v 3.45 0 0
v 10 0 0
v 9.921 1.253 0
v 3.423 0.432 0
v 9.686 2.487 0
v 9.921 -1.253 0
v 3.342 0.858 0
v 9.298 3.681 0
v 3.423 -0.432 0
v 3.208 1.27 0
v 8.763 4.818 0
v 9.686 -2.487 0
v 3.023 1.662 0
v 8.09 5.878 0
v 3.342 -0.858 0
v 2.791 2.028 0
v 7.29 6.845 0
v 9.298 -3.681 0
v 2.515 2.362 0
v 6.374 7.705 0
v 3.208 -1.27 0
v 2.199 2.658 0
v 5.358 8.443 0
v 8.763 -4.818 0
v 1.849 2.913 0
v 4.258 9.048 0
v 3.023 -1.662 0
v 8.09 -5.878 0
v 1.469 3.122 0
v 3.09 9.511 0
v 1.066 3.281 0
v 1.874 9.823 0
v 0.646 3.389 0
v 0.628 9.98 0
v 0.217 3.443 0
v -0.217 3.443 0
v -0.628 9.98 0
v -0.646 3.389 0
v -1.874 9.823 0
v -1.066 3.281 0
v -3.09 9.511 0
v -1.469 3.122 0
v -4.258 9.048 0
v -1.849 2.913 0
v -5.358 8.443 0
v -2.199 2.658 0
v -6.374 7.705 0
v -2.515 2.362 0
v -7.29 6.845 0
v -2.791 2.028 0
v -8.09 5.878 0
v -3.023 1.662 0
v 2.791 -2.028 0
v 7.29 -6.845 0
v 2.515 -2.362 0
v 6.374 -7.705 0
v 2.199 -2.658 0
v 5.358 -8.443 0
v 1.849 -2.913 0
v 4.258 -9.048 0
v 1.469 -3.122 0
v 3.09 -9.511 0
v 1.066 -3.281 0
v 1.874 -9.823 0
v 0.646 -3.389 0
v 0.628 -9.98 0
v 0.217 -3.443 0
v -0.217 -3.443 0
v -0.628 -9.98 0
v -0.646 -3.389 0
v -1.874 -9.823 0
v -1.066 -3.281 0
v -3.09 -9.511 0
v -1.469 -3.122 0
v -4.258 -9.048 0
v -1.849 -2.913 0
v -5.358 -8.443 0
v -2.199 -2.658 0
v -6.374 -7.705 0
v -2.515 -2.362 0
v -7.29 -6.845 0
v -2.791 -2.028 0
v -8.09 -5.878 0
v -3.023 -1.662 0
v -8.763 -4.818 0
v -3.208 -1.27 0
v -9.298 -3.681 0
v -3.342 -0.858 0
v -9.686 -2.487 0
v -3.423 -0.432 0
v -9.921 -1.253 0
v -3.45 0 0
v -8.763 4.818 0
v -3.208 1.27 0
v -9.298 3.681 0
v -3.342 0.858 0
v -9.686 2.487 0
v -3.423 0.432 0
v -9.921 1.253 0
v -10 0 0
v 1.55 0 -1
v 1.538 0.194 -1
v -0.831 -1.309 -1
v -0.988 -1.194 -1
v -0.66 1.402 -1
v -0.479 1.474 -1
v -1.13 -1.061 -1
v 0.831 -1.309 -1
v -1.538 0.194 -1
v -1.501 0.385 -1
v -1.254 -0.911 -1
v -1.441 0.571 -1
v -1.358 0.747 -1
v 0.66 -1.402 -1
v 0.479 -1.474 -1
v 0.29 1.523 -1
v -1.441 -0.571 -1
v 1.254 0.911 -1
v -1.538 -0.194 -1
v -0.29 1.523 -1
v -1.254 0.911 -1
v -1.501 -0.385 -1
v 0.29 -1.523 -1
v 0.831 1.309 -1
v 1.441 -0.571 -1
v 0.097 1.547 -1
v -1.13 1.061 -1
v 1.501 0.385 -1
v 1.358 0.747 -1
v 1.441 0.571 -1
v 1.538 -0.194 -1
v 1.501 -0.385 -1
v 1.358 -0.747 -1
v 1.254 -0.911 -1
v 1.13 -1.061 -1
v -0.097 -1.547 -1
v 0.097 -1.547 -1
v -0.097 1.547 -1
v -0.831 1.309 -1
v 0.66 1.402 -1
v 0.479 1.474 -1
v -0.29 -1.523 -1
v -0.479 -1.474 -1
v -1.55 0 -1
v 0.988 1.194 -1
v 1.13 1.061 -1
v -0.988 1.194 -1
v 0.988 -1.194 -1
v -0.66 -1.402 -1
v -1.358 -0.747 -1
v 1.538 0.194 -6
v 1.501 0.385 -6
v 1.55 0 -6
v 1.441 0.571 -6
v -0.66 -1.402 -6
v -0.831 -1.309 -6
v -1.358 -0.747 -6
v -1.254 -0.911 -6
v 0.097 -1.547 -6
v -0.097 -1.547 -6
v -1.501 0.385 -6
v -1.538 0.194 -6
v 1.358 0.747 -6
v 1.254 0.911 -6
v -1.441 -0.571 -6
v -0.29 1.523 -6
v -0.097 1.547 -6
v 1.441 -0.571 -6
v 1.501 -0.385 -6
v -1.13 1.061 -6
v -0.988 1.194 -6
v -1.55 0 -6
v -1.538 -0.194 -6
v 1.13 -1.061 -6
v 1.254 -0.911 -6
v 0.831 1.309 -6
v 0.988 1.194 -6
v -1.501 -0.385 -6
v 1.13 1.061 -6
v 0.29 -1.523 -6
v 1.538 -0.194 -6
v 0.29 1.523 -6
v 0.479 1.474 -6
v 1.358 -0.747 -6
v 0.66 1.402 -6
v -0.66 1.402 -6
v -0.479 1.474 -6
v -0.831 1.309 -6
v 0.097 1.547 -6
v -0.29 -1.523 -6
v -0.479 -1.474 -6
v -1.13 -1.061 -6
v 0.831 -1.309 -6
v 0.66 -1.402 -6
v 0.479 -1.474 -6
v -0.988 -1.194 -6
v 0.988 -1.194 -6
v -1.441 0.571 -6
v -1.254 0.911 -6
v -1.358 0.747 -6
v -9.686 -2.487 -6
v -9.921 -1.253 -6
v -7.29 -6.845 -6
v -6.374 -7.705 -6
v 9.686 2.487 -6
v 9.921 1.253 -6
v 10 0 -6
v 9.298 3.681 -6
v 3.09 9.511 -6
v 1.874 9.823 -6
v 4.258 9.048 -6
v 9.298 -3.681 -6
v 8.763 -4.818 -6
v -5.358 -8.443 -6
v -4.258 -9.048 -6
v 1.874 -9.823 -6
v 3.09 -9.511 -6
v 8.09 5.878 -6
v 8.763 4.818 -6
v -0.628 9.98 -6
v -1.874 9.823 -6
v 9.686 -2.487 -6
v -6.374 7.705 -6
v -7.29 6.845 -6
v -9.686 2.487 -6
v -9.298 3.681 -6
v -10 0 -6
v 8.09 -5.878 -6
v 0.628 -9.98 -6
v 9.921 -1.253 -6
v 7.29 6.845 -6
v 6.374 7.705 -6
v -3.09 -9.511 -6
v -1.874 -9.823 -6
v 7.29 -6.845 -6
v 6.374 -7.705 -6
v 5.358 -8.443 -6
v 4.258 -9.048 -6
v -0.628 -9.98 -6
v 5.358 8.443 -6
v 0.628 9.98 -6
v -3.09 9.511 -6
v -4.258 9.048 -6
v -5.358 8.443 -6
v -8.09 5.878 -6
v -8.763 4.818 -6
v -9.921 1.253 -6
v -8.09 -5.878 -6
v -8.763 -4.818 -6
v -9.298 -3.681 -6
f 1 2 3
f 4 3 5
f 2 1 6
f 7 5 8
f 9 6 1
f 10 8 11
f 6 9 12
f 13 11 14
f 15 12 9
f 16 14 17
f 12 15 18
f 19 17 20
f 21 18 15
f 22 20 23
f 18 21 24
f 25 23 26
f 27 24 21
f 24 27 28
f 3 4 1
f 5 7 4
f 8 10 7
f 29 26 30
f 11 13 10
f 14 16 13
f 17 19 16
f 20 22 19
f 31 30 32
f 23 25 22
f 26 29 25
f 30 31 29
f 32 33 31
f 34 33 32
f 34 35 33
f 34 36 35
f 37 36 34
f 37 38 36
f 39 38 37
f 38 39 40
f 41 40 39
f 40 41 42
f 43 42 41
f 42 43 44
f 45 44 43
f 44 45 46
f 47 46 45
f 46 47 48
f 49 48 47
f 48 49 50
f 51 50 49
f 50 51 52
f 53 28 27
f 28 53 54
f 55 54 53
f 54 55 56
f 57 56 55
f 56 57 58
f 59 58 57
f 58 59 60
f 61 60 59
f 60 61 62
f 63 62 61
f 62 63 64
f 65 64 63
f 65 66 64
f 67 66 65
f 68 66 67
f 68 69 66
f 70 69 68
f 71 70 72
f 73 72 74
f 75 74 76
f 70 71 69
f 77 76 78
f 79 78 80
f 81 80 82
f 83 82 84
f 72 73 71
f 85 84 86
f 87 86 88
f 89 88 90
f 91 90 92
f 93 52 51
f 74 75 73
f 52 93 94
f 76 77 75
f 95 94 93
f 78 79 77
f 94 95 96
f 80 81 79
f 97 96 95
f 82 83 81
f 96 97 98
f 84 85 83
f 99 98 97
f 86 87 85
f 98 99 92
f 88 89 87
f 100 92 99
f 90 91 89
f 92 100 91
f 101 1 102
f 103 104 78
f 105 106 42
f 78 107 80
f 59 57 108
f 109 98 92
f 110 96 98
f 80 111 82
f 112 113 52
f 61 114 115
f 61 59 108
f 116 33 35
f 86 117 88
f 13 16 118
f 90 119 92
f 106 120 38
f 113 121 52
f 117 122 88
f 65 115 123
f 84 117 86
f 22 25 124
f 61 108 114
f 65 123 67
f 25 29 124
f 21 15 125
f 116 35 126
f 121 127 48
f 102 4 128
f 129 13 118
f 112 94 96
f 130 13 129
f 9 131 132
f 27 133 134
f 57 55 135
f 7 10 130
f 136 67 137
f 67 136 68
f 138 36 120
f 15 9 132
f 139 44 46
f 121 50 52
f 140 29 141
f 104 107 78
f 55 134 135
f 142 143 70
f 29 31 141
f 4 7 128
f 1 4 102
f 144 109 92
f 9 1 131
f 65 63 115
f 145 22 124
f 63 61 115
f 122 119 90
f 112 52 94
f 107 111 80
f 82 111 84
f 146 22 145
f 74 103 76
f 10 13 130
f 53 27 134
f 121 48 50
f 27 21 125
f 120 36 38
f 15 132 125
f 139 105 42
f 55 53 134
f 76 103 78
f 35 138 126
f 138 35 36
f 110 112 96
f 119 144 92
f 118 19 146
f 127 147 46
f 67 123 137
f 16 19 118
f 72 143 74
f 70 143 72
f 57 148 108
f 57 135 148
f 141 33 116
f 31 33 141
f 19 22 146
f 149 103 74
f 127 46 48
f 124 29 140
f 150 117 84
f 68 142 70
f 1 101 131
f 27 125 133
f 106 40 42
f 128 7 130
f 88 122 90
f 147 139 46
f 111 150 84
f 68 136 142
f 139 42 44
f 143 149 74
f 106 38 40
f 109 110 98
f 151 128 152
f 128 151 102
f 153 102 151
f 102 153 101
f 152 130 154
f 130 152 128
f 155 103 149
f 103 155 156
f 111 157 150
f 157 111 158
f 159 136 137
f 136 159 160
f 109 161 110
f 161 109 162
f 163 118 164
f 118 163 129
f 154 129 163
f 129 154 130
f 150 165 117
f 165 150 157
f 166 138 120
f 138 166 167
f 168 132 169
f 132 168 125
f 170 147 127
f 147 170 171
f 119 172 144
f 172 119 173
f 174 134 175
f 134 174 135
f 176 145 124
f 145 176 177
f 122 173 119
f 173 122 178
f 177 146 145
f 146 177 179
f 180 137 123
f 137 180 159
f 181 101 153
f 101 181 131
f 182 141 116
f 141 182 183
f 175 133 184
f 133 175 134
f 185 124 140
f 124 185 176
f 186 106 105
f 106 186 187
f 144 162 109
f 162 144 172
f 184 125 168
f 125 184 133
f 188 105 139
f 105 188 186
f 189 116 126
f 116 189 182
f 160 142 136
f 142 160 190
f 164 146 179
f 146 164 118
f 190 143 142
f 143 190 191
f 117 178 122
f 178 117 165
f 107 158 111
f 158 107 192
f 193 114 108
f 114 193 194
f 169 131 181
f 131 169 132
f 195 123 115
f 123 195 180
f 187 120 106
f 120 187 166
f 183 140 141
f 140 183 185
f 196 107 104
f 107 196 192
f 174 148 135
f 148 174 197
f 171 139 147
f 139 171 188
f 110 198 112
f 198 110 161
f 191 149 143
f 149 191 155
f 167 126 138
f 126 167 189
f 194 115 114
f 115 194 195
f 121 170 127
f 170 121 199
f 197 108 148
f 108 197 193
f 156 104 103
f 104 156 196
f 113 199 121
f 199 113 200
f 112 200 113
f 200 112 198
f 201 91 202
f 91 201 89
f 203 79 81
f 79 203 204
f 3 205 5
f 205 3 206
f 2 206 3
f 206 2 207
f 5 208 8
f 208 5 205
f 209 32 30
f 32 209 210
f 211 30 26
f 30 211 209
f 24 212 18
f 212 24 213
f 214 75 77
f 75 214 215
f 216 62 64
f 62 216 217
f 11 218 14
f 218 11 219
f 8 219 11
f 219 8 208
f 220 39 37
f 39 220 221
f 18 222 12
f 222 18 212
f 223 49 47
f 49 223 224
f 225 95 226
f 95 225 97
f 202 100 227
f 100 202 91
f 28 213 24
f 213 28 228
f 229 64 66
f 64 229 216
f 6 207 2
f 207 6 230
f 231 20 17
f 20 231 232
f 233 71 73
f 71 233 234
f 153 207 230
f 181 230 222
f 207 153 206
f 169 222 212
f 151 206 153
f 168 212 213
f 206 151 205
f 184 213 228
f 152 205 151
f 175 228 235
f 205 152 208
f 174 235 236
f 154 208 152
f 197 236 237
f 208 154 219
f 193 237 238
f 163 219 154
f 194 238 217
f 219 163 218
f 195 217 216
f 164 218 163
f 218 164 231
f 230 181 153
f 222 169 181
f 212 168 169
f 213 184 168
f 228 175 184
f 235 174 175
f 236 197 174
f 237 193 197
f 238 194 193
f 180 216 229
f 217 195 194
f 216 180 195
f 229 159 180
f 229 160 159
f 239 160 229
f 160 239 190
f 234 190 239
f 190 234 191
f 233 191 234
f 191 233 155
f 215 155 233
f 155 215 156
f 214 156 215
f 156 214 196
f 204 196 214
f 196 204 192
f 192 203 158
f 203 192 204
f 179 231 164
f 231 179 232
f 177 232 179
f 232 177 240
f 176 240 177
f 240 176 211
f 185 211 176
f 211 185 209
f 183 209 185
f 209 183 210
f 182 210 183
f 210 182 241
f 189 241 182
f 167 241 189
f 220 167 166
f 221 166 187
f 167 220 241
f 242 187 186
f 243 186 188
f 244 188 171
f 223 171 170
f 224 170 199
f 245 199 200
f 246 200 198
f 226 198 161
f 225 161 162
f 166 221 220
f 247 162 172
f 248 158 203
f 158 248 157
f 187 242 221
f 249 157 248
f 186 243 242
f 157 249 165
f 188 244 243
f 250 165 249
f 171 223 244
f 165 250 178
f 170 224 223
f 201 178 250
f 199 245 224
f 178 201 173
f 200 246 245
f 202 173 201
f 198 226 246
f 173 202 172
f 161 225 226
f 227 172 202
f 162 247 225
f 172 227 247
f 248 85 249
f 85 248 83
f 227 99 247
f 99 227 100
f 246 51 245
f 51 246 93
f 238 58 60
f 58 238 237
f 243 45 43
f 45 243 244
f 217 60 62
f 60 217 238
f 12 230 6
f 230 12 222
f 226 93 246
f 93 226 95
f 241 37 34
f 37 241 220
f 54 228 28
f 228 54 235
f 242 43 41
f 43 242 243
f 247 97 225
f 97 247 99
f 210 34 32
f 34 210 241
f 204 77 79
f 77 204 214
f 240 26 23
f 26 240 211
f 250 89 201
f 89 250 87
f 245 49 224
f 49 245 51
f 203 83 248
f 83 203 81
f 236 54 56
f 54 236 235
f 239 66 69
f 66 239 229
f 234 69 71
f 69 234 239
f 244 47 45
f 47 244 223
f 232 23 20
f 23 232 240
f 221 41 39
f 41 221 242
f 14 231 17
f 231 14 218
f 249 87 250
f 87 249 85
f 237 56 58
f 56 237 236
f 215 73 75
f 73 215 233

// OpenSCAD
$fn = 50;

difference() {
	union() {
		translate(v = [0, 0, -6.0]) {
			cylinder(h = 6, r = 10.0);
		}
	}
	union() {
		translate(v = [0, 0, 0]) {
			rotate(a = [0, 0, 0]) {
				difference() {
					union() {
						translate(v = [0, 0, -9.0]) {
							cylinder(h = 9, r = 1.25);
						}
						translate(v = [0, 0, -1.0]) {
							cylinder(h = 1.0, r1 = 1.55, r2 = 3.45);
						}
						translate(v = [0, 0, -9.0]) {
							cylinder(h = 9, r = 1.55);
						}
						translate(v = [0, 0, -9.0]) {
							cylinder(h = 9, r = 1.25);
						}
					}
					union();
				}
			}
		}
	}
}
